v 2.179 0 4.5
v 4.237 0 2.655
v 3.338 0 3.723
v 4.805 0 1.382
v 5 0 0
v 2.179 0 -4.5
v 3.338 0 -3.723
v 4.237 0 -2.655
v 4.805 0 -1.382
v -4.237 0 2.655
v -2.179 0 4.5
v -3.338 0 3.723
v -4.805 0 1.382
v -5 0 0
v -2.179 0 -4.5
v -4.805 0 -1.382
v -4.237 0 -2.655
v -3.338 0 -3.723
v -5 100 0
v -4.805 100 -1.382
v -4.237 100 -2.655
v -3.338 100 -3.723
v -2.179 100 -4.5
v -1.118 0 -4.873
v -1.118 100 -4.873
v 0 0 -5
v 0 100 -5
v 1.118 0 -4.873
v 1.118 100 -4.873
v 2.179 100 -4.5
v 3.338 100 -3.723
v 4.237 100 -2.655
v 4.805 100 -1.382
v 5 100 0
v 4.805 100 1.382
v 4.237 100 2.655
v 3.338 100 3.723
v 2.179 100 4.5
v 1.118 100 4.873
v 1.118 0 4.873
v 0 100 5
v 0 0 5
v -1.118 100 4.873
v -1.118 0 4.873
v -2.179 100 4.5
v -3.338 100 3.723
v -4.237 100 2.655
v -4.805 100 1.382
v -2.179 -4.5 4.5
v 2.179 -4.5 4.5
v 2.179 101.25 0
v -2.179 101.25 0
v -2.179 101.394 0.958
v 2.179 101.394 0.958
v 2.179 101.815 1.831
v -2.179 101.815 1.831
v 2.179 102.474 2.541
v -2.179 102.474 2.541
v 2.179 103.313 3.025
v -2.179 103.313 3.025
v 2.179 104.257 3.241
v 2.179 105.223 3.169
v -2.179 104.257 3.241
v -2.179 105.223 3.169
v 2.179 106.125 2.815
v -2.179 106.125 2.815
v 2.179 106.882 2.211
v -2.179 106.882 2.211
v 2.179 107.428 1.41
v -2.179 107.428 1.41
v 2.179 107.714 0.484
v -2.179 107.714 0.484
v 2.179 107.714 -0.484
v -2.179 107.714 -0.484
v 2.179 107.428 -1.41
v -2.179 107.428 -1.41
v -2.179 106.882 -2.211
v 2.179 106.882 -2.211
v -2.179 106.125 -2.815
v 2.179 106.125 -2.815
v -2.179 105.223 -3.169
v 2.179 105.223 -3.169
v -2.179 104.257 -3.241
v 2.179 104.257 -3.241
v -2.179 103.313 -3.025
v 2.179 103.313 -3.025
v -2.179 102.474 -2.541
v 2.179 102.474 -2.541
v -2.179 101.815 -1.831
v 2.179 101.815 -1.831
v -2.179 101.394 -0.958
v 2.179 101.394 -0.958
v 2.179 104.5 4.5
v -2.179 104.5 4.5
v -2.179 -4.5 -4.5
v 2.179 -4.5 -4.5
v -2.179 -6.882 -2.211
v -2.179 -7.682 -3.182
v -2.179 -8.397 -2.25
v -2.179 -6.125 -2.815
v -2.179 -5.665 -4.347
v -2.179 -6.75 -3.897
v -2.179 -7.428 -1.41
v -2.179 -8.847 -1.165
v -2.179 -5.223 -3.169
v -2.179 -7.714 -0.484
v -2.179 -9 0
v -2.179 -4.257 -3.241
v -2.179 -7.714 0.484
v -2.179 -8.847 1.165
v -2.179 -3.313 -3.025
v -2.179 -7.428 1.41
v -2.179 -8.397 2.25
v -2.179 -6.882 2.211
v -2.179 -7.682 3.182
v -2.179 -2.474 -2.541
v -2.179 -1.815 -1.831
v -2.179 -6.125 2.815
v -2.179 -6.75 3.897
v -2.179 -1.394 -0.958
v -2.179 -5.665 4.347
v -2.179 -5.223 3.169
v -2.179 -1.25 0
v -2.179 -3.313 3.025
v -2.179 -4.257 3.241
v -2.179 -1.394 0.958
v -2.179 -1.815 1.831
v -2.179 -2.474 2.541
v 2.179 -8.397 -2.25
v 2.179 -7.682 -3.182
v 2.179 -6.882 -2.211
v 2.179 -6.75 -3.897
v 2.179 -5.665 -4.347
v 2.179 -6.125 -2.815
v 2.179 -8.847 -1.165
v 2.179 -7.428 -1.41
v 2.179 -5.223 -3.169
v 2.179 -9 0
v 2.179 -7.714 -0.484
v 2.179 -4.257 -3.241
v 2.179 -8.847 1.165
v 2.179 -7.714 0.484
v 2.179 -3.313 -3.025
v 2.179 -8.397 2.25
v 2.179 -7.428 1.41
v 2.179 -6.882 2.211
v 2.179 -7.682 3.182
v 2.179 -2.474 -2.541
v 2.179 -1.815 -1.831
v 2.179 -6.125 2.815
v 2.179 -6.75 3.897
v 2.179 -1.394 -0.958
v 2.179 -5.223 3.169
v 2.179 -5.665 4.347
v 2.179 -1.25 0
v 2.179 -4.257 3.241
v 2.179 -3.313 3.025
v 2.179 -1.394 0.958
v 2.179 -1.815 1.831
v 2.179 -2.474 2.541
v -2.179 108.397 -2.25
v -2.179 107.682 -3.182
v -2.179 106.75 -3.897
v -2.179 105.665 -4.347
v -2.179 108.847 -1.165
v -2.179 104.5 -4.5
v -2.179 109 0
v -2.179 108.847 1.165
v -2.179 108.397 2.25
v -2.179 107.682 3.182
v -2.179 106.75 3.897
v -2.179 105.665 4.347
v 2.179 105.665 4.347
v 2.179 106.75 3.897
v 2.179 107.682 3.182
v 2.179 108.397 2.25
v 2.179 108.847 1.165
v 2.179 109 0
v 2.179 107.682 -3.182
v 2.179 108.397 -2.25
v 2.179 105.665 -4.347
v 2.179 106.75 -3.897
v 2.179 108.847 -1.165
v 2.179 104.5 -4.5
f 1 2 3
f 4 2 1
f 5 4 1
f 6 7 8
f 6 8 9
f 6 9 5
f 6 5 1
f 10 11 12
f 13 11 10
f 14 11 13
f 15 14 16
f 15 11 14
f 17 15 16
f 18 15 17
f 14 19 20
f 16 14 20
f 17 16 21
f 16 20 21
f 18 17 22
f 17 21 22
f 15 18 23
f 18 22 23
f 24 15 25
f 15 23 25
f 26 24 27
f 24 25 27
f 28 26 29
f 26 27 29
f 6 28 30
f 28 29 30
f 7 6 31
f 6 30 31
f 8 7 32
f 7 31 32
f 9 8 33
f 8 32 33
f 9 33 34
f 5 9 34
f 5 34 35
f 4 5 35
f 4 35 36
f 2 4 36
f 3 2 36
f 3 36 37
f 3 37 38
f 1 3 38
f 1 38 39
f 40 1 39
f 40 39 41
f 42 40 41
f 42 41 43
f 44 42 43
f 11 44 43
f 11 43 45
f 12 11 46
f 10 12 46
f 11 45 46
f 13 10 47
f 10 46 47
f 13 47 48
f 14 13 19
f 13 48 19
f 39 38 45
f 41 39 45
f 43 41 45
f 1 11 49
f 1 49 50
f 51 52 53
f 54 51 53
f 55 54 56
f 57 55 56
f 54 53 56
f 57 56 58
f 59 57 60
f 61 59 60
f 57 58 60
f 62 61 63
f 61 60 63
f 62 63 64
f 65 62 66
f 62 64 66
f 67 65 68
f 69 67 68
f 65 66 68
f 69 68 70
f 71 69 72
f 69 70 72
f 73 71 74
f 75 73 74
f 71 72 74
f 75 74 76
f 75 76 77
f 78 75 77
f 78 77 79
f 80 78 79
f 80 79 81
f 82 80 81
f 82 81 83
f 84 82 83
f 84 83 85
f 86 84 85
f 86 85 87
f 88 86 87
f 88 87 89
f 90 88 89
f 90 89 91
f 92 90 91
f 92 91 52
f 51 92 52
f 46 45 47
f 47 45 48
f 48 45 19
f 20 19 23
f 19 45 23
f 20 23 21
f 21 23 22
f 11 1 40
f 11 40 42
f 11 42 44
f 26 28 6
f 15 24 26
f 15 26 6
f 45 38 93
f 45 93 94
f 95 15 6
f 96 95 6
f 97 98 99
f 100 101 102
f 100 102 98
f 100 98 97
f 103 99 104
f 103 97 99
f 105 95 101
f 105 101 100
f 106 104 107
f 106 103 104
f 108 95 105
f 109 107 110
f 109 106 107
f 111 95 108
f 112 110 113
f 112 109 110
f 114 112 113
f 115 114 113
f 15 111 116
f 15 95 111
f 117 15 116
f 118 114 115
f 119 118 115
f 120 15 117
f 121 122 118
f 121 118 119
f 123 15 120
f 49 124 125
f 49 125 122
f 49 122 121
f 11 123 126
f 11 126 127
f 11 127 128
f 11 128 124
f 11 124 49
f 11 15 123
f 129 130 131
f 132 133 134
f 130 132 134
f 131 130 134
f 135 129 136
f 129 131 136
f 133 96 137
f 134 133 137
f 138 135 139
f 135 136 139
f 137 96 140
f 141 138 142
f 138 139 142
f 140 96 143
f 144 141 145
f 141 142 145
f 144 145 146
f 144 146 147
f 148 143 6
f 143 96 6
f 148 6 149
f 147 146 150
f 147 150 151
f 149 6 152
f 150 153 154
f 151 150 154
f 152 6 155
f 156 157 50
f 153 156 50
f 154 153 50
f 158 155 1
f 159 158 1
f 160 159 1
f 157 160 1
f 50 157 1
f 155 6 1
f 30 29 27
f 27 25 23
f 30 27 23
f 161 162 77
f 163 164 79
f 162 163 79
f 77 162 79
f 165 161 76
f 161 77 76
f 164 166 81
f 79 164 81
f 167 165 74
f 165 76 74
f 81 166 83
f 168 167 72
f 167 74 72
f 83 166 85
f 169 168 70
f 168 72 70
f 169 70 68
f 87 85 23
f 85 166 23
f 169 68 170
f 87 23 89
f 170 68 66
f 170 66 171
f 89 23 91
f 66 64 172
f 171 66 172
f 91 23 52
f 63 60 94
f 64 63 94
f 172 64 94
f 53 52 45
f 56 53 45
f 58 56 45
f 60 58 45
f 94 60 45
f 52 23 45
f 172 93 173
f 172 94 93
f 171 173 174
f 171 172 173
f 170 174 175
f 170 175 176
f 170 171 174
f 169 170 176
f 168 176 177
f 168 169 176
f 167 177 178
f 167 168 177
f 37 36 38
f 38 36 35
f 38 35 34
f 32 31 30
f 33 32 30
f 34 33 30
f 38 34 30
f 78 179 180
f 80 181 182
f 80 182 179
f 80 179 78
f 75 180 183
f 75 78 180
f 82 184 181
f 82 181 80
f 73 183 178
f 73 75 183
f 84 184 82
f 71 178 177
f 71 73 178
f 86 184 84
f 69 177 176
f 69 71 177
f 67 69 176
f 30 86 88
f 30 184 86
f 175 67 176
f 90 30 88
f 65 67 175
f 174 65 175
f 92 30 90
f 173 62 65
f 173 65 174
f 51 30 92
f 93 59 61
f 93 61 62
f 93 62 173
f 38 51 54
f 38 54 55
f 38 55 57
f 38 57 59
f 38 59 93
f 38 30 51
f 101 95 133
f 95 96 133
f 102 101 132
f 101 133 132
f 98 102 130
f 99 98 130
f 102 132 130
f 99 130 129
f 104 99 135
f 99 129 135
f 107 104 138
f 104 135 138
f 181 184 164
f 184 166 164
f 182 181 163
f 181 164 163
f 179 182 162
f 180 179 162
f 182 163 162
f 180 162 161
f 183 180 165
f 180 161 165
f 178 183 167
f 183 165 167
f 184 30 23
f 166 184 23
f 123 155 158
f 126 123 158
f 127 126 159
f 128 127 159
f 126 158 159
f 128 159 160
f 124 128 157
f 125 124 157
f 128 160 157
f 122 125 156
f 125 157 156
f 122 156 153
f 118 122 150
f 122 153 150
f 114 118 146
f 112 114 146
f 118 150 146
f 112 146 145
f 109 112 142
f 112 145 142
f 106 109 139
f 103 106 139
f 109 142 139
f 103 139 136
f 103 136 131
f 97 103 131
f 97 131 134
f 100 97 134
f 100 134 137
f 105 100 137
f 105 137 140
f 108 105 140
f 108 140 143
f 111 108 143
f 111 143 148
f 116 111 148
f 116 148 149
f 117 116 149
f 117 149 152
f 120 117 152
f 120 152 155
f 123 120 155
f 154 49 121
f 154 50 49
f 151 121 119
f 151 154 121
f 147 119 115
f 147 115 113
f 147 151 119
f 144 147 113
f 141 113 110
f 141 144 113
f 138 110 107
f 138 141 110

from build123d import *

# Parameters (mm, degrees)
F0_W      = 5
F0_H      = 100
F2_W      = 4.3588989435
F2_H      = 9
F3_DEPTH  = 9
F4_R      = 3.25
F5_DEPTH  = 5
F6_R      = 4.49999
F7_W      = 4.3588989435
F7_H      = 9
F8_DEPTH  = 9
F9_R      = 3.25
F10_DEPTH = 5
F11_R     = 4.49999


# Not quite as in the source:
# - a fillet or chamfer is up to 0.001 mm smaller than in the source, because OpenCascade refuses the exact size


with BuildPart() as f1:
    # F0 (on Top) → F1 (revolve)
    with BuildSketch(Plane.XY):
        with Locations((-2.5, 50)):
            Rectangle(F0_W, F0_H)
    revolve(axis=Axis((0, 50, 0), (0, -1, 0)))

    # F2 (on face) → F3 (join)
    with BuildSketch(Plane.XZ):
        Rectangle(F2_W, F2_H)
    extrude(amount=F3_DEPTH)

    # F4 (on face) → F5 (cut)
    with BuildSketch(Plane.YZ.offset(2.1794494718)):
        with Locations((-4.5, 0)):
            Circle(F4_R)
    extrude(amount=-F5_DEPTH, mode=Mode.SUBTRACT)

    # F6 (radius 4.5 in the source; OpenCascade refuses exactly that, so slightly less here)
    f6_edges = [f1.edges().sort_by_distance(p)[0] for p in [
        (0, -9, 4.5),
        (0, -9, -4.5),
    ]]
    fillet(f6_edges, radius=F6_R)

    # F7 (on face) → F8 (join)
    with BuildSketch(Plane(origin=(0, 100, 0), x_dir=(-1, 0, 0), z_dir=(0, 1, 0))):
        Rectangle(F7_W, F7_H)
    extrude(amount=F8_DEPTH)

    # F9 (on face) → F10 (cut)
    with BuildSketch(Plane(origin=(-2.1794494718, 0, 0), x_dir=(0, -1, 0), z_dir=(-1, 0, 0))):
        with Locations((-104.5, 0)):
            Circle(F9_R)
    extrude(amount=-F10_DEPTH, mode=Mode.SUBTRACT)

    # F11 (radius 4.5 in the source; OpenCascade refuses exactly that, so slightly less here)
    f11_edges = [f1.edges().sort_by_distance(p)[0] for p in [
        (0, 109, 4.5),
        (0, 109, -4.5),
    ]]
    fillet(f11_edges, radius=F11_R)


solid = f1.part
